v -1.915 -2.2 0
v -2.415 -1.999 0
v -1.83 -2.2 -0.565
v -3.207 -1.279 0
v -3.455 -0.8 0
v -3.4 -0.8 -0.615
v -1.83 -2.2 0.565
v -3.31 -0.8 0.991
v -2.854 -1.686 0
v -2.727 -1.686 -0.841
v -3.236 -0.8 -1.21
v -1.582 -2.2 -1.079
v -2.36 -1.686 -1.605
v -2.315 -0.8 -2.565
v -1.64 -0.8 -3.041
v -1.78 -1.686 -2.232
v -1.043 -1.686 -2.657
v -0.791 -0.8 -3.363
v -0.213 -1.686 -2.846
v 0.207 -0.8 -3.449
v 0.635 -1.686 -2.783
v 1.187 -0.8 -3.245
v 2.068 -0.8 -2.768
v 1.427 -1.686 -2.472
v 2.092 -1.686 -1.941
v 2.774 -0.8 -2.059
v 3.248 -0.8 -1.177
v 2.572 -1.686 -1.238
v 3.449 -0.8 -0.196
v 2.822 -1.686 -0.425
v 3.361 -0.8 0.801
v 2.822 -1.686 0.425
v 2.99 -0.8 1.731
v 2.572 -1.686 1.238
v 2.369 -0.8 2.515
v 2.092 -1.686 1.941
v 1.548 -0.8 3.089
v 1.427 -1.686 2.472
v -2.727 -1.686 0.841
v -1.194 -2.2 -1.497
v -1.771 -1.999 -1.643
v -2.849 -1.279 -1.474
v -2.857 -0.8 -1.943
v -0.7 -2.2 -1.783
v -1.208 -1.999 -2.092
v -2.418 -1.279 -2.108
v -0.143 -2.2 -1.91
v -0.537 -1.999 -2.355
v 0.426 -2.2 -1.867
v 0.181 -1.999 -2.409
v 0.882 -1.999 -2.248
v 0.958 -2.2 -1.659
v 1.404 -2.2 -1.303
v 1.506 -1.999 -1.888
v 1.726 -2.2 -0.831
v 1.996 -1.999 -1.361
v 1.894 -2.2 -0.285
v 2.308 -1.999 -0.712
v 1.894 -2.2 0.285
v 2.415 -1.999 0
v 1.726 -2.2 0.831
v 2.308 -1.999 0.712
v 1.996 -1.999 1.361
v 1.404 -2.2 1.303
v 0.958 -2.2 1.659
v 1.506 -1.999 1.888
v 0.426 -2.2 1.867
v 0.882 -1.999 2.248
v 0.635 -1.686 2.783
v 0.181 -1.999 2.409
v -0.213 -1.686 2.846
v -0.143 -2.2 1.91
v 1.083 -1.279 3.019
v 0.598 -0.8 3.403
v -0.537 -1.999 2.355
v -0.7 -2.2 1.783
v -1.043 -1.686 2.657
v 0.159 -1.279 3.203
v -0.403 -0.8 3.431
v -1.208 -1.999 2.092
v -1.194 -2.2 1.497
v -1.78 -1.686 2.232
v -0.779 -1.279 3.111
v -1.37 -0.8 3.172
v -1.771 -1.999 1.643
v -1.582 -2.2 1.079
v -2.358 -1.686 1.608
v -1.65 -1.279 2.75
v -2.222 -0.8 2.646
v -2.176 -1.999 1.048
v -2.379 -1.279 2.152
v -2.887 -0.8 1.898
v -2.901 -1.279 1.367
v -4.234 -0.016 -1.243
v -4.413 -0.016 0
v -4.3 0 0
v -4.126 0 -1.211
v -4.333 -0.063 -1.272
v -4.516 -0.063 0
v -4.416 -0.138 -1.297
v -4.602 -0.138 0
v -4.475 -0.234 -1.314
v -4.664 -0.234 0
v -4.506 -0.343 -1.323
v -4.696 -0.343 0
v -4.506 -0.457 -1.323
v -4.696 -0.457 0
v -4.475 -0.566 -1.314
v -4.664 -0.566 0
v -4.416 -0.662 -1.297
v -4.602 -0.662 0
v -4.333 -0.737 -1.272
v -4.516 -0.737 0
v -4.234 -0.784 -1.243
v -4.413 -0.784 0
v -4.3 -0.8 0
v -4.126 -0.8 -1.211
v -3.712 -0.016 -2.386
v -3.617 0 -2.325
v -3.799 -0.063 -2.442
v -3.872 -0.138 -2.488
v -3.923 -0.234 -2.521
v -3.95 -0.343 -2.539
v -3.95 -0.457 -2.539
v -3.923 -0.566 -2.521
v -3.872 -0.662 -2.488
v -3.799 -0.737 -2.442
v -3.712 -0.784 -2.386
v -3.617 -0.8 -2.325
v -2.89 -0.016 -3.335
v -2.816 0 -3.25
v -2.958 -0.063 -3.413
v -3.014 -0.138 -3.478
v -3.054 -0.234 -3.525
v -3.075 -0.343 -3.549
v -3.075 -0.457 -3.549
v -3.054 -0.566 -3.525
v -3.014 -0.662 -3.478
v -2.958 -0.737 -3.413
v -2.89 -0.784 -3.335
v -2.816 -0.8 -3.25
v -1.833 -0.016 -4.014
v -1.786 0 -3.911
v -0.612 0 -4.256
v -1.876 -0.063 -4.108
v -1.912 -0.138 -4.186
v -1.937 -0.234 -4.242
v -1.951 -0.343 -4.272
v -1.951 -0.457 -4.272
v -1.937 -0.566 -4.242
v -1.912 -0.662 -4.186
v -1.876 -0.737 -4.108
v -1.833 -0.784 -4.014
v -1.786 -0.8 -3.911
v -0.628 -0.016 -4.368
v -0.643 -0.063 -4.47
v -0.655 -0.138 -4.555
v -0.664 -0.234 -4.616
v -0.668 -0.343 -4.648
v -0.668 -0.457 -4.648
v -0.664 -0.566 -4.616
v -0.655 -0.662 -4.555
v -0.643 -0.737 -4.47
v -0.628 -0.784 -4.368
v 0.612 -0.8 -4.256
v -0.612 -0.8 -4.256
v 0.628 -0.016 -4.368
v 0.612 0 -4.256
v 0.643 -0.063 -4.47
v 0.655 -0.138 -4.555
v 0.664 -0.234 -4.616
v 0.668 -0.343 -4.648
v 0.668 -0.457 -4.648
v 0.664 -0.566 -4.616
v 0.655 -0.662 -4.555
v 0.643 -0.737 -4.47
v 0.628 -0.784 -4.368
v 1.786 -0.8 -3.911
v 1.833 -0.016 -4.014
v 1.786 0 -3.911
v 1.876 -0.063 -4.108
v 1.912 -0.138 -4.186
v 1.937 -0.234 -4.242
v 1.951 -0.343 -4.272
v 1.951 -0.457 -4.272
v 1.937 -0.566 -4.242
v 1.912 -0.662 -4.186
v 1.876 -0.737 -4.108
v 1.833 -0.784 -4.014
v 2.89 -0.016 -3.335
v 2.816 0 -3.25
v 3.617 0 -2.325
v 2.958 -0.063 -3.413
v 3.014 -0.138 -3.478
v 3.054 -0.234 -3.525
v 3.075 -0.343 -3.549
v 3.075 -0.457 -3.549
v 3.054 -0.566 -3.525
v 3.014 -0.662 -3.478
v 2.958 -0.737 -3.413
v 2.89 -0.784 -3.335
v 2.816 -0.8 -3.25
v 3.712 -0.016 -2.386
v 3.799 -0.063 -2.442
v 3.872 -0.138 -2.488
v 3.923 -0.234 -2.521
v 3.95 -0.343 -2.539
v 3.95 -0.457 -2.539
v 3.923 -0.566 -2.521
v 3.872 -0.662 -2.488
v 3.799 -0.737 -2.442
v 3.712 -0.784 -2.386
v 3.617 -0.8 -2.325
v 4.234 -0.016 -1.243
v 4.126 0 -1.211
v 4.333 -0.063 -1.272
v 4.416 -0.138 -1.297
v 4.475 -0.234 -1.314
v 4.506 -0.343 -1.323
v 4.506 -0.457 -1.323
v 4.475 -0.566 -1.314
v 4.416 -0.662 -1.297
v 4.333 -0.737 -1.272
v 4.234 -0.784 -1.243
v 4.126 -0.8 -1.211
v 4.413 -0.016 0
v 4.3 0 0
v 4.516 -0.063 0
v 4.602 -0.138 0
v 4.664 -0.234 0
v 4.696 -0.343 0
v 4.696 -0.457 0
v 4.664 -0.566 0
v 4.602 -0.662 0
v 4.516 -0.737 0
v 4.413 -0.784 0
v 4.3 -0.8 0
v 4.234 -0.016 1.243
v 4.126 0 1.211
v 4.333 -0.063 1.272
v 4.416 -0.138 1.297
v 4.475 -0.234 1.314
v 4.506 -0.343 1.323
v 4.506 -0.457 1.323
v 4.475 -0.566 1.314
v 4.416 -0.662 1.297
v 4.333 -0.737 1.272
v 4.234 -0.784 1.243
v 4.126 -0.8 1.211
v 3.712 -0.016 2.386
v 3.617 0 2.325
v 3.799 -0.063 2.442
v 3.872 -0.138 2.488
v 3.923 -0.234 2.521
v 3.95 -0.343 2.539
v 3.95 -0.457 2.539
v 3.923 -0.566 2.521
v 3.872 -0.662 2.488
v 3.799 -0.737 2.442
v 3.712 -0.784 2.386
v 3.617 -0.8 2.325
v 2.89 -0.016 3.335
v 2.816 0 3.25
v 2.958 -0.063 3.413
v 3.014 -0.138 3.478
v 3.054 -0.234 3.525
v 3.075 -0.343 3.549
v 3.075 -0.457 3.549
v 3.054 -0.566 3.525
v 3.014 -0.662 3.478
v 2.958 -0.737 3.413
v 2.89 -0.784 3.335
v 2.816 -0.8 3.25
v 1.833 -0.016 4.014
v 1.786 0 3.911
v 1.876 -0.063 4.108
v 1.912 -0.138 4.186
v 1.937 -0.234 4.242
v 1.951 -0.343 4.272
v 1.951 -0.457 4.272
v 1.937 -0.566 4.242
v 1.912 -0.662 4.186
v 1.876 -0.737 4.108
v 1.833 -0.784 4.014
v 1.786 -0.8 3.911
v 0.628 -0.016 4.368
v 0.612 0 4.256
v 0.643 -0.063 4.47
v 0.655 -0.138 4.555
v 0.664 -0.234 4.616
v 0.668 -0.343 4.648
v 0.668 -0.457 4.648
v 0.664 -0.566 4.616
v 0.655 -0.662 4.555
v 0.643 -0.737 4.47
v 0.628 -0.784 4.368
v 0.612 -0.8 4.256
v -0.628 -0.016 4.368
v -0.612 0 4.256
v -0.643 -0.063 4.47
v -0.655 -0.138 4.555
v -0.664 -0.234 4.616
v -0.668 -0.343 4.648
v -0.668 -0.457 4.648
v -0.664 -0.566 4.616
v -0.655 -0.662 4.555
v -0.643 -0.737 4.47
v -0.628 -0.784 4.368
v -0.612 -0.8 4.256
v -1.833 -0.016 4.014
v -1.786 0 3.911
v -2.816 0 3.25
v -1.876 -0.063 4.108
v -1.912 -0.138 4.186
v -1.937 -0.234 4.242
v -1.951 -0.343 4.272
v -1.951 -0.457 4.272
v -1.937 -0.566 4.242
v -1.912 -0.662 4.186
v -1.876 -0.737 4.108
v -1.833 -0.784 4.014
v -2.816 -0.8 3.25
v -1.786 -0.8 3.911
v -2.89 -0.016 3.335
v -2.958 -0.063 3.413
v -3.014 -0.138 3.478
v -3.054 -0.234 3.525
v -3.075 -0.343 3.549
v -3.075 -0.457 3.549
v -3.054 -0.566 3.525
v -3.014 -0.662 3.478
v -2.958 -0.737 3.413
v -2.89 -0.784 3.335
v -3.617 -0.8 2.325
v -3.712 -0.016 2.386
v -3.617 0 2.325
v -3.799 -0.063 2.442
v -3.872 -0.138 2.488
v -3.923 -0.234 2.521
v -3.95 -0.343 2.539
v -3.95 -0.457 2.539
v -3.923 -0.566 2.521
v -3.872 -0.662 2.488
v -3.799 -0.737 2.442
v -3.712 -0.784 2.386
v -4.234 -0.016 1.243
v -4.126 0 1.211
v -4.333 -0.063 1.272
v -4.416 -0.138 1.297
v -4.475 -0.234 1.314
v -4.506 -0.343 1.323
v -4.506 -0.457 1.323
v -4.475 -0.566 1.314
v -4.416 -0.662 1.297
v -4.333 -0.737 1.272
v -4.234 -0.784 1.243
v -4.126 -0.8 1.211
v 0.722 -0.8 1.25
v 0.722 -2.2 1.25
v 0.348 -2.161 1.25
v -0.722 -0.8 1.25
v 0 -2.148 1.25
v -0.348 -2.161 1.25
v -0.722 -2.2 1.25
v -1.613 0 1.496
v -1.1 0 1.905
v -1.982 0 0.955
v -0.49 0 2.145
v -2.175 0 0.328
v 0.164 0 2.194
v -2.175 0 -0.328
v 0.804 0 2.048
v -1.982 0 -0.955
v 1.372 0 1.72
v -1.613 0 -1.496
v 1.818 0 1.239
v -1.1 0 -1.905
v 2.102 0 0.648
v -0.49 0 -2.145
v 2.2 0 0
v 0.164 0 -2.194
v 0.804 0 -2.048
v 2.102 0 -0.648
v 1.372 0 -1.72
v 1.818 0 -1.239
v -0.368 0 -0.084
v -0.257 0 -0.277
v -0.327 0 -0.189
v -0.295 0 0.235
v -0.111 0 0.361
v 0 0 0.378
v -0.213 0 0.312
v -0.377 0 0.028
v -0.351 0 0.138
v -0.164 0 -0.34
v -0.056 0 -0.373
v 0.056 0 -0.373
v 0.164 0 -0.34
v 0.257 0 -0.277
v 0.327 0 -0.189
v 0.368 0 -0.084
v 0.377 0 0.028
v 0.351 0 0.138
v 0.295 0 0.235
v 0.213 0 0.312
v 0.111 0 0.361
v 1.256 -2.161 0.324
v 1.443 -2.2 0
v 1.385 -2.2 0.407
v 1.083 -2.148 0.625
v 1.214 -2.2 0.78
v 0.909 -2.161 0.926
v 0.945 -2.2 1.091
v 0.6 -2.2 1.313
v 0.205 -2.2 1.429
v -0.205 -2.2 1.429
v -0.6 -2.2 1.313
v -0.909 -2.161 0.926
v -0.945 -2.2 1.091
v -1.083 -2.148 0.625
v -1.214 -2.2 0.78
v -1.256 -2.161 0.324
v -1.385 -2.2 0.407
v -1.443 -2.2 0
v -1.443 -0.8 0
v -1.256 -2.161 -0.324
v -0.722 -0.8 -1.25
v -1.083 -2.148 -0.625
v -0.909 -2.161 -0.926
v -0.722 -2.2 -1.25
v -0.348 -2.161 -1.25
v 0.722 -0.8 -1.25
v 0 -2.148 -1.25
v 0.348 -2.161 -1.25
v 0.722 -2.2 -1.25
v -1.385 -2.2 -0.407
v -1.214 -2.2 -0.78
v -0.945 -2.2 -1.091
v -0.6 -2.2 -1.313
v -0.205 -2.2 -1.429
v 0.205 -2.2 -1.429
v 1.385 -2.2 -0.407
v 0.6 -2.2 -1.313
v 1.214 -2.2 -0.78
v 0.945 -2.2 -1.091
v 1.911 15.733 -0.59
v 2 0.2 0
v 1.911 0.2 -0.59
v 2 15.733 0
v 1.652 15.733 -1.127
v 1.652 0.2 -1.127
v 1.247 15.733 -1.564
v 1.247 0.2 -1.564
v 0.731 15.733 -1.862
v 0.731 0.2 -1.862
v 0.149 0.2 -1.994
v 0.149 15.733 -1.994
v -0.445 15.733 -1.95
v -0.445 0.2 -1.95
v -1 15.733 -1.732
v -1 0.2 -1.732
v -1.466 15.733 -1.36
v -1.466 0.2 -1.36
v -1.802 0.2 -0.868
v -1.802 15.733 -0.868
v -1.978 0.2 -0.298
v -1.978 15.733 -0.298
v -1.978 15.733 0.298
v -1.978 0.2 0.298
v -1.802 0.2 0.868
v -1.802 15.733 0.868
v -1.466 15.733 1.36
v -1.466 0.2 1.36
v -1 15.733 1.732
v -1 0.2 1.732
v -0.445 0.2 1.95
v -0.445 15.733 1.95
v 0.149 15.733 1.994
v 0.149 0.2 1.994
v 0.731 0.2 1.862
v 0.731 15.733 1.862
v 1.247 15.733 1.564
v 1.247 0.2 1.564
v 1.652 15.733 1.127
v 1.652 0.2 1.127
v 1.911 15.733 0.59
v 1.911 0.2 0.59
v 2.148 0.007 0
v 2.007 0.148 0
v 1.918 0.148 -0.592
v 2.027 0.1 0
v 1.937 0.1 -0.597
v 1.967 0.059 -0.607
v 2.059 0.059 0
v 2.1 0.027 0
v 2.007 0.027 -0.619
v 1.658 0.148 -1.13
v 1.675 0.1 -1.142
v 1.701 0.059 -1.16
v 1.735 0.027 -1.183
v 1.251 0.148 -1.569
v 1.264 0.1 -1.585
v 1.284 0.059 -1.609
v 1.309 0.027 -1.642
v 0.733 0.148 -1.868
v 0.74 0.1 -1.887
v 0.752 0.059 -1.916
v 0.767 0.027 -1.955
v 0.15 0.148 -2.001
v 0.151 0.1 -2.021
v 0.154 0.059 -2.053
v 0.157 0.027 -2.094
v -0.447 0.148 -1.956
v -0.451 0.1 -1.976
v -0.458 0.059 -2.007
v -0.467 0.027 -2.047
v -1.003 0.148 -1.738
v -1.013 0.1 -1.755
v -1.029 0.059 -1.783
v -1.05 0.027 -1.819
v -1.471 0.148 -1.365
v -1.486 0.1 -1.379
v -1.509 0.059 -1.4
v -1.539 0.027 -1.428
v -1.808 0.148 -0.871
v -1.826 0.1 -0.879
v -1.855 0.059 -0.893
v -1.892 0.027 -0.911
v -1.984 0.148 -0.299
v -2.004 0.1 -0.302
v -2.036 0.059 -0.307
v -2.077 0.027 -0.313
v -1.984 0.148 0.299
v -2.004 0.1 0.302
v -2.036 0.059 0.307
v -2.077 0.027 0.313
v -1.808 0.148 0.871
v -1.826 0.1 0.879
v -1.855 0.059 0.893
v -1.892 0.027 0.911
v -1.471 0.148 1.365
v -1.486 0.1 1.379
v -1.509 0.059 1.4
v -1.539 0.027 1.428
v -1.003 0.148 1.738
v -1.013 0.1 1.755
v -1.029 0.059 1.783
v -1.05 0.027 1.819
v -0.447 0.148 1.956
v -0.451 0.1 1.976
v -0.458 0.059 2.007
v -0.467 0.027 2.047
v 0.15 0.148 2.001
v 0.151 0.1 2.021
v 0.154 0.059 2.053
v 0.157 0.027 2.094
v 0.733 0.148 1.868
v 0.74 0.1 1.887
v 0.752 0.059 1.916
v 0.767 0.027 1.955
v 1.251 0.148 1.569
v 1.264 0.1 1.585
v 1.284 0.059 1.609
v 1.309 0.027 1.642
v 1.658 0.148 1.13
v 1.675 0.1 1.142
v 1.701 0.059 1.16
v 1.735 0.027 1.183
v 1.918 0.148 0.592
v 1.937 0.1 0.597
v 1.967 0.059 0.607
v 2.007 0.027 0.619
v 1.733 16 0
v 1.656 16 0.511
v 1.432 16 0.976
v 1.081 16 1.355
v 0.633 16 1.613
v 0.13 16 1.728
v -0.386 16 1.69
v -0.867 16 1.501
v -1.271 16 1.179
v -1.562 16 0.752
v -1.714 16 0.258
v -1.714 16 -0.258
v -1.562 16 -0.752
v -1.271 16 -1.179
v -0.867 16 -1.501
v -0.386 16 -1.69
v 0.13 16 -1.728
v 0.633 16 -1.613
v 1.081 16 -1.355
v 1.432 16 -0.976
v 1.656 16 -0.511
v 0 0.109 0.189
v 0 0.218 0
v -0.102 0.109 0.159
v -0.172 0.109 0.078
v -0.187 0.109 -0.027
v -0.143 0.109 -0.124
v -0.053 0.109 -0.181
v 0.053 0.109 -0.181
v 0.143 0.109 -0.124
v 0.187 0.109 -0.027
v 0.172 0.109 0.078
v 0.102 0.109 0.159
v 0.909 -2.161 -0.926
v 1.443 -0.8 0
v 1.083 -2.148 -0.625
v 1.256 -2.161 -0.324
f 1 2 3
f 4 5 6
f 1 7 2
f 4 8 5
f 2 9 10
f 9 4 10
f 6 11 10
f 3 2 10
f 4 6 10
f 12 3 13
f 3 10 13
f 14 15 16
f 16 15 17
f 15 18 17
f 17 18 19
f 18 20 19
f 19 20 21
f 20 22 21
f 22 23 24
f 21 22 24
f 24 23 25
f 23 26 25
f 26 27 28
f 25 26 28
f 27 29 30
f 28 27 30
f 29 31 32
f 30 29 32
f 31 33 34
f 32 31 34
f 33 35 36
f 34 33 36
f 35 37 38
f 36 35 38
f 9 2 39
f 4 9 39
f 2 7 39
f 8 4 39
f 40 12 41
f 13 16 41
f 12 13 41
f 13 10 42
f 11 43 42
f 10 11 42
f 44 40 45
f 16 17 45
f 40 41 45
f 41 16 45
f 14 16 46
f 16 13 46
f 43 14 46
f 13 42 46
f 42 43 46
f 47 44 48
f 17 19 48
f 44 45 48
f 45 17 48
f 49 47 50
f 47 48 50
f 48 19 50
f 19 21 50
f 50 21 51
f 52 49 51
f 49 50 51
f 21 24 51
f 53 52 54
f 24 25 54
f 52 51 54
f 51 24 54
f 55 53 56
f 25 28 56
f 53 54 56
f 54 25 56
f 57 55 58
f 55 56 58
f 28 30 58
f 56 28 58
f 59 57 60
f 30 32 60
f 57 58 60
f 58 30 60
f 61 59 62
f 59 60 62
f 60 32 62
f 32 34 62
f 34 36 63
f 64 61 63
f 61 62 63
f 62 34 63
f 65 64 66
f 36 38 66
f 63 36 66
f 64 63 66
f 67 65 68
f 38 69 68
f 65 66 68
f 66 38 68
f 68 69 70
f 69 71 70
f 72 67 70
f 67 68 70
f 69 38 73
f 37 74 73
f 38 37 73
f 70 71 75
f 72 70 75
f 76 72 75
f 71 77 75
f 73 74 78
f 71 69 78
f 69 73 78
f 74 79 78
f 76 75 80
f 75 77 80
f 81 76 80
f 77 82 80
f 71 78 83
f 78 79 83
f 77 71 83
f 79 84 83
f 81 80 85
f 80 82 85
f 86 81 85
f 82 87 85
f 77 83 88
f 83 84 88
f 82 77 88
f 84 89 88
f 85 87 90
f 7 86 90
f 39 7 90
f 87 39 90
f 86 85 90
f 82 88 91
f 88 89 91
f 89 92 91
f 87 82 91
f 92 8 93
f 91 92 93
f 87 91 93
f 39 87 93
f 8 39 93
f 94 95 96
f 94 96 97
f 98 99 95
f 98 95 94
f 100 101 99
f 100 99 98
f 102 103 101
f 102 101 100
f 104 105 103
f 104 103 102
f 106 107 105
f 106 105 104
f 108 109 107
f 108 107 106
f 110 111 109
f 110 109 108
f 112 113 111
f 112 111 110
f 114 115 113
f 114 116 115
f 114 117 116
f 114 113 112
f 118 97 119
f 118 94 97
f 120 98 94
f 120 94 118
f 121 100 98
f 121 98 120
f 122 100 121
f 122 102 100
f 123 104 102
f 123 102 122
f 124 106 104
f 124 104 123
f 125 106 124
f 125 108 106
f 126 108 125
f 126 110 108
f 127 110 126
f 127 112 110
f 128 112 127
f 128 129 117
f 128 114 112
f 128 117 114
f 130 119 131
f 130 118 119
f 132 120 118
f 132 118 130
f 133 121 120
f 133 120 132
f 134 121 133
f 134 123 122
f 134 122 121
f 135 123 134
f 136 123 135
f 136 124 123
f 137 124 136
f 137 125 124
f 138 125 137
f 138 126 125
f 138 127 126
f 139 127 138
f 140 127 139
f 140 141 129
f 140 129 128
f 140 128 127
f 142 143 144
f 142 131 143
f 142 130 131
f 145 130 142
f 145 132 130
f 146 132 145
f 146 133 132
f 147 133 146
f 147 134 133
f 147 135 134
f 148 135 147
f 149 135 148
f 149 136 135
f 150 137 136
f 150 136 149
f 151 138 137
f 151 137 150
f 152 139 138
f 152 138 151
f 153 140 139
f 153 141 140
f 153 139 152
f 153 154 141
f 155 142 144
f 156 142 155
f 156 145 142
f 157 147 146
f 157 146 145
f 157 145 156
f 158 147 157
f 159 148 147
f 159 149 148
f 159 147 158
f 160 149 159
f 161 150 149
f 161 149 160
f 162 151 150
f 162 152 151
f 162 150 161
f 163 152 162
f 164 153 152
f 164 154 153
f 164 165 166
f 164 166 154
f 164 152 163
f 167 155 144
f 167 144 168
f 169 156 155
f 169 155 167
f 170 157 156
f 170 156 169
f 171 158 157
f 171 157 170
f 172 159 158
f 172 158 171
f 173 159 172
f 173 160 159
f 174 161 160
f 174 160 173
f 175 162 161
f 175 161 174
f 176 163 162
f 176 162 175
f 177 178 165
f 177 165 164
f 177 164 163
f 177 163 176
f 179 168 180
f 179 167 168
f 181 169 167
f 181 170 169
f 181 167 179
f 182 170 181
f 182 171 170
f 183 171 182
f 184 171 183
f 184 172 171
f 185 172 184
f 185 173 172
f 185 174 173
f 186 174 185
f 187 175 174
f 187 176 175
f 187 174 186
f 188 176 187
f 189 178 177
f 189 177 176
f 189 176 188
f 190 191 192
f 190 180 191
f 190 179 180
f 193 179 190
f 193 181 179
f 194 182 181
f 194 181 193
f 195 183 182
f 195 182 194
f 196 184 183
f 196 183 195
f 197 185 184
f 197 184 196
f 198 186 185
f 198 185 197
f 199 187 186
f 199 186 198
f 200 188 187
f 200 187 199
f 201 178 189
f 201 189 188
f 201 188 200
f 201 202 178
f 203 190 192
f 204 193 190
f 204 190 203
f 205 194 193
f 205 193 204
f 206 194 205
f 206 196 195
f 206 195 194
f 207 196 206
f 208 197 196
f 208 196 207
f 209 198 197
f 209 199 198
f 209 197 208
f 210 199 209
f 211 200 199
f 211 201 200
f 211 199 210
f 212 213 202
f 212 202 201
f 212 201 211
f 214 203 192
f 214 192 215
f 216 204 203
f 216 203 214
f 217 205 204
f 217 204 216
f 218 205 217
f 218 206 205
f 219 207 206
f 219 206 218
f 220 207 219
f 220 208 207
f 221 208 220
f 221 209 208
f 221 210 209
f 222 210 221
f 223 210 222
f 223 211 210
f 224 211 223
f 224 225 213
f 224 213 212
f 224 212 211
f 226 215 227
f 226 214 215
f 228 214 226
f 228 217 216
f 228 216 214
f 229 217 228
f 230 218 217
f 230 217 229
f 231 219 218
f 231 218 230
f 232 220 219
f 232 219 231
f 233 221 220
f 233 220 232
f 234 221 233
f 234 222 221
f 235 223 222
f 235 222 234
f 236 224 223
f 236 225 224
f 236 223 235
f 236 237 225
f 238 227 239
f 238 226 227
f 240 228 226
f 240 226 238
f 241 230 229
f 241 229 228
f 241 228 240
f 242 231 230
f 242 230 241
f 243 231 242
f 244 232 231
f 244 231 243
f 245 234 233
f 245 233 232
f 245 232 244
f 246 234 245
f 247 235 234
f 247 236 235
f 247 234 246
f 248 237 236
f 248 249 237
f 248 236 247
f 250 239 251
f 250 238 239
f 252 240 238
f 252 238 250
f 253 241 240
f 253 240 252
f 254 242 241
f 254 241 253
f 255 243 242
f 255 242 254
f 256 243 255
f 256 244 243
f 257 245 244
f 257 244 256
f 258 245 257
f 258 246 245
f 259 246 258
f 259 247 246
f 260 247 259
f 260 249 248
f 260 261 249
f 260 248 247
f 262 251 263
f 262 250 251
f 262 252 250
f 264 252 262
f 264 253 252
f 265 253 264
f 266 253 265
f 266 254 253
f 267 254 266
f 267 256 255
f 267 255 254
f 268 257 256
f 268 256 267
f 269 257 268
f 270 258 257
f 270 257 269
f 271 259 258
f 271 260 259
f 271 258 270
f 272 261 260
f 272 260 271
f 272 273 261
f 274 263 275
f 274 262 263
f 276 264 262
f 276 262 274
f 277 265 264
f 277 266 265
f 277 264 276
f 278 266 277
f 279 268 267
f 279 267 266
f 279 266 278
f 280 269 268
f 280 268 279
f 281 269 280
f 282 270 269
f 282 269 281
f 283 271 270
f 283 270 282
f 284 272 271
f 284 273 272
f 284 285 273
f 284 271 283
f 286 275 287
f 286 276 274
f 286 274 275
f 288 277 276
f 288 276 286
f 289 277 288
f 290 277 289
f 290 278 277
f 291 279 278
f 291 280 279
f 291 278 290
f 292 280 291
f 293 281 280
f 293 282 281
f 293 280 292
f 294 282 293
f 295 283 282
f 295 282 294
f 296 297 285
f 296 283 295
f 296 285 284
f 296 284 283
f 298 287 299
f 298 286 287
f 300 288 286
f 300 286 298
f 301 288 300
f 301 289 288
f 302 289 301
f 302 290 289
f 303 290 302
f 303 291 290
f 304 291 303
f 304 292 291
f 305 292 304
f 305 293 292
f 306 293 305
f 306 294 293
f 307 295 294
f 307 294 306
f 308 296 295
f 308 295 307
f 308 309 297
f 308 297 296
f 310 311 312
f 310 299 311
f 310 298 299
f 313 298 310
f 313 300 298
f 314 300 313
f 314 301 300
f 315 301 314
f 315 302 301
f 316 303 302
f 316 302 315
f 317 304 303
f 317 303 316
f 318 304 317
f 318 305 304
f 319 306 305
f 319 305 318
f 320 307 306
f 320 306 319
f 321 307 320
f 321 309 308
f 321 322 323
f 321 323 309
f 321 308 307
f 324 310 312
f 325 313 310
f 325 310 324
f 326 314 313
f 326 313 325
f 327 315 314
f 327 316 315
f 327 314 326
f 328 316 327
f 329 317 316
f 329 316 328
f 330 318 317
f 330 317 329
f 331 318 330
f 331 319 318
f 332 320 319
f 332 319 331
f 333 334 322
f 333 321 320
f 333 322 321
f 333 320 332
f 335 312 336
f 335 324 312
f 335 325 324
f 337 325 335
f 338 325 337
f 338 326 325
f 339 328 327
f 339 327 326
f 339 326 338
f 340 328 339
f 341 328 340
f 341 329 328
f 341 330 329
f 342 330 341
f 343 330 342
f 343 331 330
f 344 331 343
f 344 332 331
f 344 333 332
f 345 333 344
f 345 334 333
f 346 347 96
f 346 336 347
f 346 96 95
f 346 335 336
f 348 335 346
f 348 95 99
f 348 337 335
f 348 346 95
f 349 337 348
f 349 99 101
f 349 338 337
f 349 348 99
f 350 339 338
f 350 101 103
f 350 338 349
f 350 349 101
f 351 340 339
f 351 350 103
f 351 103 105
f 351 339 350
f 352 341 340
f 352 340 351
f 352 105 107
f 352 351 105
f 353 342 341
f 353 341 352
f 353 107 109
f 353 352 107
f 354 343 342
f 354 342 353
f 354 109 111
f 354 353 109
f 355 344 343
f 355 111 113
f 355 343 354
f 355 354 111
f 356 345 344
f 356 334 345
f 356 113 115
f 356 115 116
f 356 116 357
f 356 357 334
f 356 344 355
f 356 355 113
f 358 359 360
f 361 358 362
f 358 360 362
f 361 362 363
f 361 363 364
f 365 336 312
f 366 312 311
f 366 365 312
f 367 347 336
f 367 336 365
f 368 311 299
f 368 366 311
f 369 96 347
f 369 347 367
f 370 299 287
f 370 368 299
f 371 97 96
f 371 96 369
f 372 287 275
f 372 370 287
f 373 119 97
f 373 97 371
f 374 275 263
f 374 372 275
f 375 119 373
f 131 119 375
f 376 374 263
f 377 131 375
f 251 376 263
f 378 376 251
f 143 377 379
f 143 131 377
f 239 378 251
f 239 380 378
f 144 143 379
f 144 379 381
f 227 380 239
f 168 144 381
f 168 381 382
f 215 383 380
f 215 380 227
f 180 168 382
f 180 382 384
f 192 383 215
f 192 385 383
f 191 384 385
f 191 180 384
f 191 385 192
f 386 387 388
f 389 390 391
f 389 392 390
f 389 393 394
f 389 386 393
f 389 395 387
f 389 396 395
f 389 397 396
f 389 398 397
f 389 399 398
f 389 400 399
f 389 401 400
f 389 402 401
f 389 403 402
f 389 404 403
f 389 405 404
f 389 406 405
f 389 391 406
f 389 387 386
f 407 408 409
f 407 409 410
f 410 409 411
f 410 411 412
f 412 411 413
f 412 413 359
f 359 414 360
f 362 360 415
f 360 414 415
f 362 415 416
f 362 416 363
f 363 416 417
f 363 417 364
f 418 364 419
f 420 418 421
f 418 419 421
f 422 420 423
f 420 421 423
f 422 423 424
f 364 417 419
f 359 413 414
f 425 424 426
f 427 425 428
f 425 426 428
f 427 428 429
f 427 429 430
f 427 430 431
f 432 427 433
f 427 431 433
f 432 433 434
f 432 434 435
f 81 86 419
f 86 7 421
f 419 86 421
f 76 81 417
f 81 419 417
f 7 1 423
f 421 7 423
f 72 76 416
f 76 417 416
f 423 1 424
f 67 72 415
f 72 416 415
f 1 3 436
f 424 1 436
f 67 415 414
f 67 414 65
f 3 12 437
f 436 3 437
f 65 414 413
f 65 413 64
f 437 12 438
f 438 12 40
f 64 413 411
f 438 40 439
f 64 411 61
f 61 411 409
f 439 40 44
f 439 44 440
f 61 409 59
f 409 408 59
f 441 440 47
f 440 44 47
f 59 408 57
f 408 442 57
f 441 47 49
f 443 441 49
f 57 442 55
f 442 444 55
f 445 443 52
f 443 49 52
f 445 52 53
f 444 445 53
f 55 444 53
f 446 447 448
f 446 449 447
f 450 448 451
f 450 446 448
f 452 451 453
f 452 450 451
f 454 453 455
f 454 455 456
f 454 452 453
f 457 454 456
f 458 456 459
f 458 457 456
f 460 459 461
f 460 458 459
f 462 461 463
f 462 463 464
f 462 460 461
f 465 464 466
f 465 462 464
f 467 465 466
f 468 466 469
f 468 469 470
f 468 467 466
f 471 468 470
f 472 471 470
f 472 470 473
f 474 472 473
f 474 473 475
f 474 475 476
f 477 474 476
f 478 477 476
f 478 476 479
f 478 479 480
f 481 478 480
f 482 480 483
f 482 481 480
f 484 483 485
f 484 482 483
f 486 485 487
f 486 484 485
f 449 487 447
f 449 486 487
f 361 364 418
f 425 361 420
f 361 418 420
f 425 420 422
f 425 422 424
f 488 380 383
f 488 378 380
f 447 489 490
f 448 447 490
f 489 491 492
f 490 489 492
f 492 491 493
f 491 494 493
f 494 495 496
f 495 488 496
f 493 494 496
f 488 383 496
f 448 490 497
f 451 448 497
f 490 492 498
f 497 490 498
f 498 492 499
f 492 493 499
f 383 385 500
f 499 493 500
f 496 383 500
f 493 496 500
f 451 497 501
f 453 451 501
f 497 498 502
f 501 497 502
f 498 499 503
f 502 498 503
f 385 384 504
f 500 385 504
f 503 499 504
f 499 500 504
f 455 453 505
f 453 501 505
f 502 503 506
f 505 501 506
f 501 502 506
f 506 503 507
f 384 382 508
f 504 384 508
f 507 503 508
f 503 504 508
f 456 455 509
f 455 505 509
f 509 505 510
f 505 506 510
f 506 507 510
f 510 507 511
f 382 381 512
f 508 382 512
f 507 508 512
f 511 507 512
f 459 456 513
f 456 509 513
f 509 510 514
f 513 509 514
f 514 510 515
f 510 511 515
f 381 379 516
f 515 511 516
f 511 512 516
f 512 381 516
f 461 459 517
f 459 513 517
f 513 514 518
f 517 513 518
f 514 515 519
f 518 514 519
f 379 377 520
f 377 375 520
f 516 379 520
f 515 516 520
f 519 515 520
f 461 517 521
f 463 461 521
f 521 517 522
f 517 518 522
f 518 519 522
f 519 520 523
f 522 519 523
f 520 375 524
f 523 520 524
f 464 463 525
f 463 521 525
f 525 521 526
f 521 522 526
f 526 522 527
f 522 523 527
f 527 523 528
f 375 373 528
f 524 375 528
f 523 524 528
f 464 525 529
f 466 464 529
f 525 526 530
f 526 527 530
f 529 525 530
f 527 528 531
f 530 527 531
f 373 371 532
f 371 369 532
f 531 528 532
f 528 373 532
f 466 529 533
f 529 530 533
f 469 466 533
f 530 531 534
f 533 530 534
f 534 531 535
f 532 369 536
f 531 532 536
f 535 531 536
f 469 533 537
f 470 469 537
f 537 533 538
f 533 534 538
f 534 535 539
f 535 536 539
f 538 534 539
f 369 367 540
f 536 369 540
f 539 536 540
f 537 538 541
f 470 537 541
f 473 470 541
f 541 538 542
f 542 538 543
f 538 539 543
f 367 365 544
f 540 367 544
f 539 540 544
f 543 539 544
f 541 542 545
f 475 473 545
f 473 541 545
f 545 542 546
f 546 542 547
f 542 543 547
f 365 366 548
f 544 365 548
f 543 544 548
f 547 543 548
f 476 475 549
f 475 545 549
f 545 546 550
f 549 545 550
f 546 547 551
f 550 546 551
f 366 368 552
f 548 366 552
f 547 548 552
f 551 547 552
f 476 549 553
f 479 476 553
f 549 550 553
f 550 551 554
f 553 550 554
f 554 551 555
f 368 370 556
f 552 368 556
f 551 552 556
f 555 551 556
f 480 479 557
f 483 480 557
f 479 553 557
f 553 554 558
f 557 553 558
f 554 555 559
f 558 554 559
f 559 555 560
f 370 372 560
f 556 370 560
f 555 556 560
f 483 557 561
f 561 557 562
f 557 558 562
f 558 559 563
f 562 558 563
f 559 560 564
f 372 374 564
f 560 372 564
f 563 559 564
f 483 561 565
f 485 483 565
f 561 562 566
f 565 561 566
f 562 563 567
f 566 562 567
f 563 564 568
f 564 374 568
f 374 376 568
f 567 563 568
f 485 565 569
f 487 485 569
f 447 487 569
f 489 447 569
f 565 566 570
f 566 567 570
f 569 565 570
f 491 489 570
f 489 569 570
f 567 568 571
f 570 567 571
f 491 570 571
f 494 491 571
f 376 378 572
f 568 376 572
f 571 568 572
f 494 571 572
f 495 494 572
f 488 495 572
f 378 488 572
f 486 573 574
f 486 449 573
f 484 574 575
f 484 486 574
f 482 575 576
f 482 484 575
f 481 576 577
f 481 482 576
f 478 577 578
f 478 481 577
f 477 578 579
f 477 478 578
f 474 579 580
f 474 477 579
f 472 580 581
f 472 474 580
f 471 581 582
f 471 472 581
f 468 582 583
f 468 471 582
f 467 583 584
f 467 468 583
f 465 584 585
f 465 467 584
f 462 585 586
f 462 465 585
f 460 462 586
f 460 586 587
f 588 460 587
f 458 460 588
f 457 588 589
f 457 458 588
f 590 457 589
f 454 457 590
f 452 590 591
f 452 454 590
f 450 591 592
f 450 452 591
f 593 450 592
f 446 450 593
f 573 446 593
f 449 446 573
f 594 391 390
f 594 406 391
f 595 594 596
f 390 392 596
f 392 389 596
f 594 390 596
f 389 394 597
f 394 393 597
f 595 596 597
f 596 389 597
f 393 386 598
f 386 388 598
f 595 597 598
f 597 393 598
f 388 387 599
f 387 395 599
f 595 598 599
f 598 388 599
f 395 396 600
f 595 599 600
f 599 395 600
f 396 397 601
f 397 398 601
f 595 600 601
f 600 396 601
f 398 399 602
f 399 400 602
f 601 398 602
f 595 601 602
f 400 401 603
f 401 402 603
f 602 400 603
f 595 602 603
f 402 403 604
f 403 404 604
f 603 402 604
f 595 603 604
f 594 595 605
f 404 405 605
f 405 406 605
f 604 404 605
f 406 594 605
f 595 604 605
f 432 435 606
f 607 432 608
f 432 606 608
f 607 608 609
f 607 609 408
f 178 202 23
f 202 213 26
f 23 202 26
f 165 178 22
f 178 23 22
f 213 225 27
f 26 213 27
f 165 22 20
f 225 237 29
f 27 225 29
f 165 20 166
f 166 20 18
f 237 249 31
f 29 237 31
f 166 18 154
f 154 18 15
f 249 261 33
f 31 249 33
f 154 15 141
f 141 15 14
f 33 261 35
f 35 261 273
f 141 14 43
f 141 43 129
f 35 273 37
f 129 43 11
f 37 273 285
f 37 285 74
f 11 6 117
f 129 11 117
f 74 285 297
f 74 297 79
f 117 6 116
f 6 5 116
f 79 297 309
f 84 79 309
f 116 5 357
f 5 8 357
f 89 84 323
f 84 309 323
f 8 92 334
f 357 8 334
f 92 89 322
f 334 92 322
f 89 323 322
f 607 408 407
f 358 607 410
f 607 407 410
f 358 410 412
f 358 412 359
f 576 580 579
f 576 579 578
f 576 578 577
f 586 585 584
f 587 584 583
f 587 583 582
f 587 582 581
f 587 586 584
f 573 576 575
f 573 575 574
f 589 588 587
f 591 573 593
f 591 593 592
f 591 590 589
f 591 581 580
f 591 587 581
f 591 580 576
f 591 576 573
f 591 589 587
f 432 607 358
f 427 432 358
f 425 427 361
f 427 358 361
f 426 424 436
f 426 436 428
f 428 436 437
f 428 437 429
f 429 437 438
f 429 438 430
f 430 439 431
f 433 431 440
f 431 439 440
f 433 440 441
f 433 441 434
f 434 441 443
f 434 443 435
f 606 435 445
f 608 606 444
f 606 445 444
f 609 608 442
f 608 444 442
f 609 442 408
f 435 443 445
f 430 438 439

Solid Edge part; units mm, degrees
sketch "Sketch1" plane through (0, 0, 0) normal (0, 0, 1) x (1, 0, 0)
  line L0 (2, 0) -> (2, 16)
  line L1 (0, 16) -> (2, 16)
  line L2 (0, 0) -> (0, 16)
  line L3 (0, 0) -> (0, -2.2)
  line L4 (0, -2.2) -> (3.6, -2.2)
  line L5 (3.6, -2.2) -> (3.6, 0)
  line L6 (3.6, 0) -> (2, 0)
revolve "RevolvedProtrusion1" add sketch "Sketch1" angle 360 about axis through (0, 0, 0) along (0, 1, 0)
sketch "Sketch2" plane through (0, 0, 0) normal (1, 0, 0) x (0, 1, 0)
  line L0 (-2.2, 1.9365) -> (-0.9, 1.9365)
  line L1 (0.218, 0) -> (-0.9, 1.9365)
  line L2 (-2.2, 0) -> (0.218, 0)
  line L3 (-2.2, 0) -> (-2.2, 1.9365)
revolve "RevolvedCutout1" cut sketch "Sketch2" angle 360 about axis through (0, -4.5, 0) along (0, 1, 0)
sketch "Sketch3" plane through (0, -2.2, 0) normal (0, -1, 0) x (0, 0, 1)
  circle A0 centre (0, 0) radius 1.9365
  line L0 (-1.25, -0.7217) -> (0, -1.4434)
  line L1 (0, -1.4434) -> (1.25, -0.7217)
  line L2 (1.25, -0.7217) -> (1.25, 0.7217)
  line L3 (1.25, 0.7217) -> (0, 1.4434)
  line L4 (0, 1.4434) -> (-1.25, 0.7217)
  line L5 (-1.25, 0.7217) -> (-1.25, -0.7217)
  dimension "D1" = 2.5
extrude "Protrusion1" add sketch "Sketch3" against normal up to next
sketch "Sketch4" plane through (0, 0, 0) normal (0, 0, 1) x (1, 0, 0)
  line L0 (-1.4434, -2.2) -> (0, -2.2)
  line L1 (0, -2.2) -> (0, -1.8132)
  line L2 (0, -1.8132) -> (-1.4434, -2.2)
revolve "RevolvedCutout2" cut sketch "Sketch4" angle 360 about axis through (0, -4.5, 0) along (0, 1, 0)
fillet "Round1" radius 0.2 1 edges at (0, 0, -2)
chamfer "倒斜角_2" distance 0.2667 angle 45 1 edges at (0, 16, -2)
cosmetic_thread "螺纹_3" size "M4" thread depth 15.5333
sketch "Sketch5" plane through (0, 0, 0) normal (0, 0, 1) x (1, 0, 0)
  arc A0 (-1.9153, -2.2) -> (-3.6, 0) centre (-1.3212, 0) cw
revolve "RevolvedCutout3" cut sketch "Sketch5" angle 360 about axis through (0, 0, 0) along (0, -1, 0) material side at (-3.1701, -1.4159, 0)
sketch "Sketch6" plane through (0, 0, 0) normal (0, 0, 1) x (1, 0, 0)
  arc A0 (-4.3, 0) -> (-4.3, -0.8) centre (-4.3, -0.4) ccw
  line L0 (-4.3, -0.8) -> (0, -0.8)
  line L1 (0, -0.8) -> (0, 0)
  line L2 (0, 0) -> (-4.3, 0)
revolve "RevolvedProtrusion2" add sketch "Sketch6" angle 360 about axis through (0, -0.7, 0) along (0, 1, 0)
properties part number "N2611-0316" material "铝 1060"
